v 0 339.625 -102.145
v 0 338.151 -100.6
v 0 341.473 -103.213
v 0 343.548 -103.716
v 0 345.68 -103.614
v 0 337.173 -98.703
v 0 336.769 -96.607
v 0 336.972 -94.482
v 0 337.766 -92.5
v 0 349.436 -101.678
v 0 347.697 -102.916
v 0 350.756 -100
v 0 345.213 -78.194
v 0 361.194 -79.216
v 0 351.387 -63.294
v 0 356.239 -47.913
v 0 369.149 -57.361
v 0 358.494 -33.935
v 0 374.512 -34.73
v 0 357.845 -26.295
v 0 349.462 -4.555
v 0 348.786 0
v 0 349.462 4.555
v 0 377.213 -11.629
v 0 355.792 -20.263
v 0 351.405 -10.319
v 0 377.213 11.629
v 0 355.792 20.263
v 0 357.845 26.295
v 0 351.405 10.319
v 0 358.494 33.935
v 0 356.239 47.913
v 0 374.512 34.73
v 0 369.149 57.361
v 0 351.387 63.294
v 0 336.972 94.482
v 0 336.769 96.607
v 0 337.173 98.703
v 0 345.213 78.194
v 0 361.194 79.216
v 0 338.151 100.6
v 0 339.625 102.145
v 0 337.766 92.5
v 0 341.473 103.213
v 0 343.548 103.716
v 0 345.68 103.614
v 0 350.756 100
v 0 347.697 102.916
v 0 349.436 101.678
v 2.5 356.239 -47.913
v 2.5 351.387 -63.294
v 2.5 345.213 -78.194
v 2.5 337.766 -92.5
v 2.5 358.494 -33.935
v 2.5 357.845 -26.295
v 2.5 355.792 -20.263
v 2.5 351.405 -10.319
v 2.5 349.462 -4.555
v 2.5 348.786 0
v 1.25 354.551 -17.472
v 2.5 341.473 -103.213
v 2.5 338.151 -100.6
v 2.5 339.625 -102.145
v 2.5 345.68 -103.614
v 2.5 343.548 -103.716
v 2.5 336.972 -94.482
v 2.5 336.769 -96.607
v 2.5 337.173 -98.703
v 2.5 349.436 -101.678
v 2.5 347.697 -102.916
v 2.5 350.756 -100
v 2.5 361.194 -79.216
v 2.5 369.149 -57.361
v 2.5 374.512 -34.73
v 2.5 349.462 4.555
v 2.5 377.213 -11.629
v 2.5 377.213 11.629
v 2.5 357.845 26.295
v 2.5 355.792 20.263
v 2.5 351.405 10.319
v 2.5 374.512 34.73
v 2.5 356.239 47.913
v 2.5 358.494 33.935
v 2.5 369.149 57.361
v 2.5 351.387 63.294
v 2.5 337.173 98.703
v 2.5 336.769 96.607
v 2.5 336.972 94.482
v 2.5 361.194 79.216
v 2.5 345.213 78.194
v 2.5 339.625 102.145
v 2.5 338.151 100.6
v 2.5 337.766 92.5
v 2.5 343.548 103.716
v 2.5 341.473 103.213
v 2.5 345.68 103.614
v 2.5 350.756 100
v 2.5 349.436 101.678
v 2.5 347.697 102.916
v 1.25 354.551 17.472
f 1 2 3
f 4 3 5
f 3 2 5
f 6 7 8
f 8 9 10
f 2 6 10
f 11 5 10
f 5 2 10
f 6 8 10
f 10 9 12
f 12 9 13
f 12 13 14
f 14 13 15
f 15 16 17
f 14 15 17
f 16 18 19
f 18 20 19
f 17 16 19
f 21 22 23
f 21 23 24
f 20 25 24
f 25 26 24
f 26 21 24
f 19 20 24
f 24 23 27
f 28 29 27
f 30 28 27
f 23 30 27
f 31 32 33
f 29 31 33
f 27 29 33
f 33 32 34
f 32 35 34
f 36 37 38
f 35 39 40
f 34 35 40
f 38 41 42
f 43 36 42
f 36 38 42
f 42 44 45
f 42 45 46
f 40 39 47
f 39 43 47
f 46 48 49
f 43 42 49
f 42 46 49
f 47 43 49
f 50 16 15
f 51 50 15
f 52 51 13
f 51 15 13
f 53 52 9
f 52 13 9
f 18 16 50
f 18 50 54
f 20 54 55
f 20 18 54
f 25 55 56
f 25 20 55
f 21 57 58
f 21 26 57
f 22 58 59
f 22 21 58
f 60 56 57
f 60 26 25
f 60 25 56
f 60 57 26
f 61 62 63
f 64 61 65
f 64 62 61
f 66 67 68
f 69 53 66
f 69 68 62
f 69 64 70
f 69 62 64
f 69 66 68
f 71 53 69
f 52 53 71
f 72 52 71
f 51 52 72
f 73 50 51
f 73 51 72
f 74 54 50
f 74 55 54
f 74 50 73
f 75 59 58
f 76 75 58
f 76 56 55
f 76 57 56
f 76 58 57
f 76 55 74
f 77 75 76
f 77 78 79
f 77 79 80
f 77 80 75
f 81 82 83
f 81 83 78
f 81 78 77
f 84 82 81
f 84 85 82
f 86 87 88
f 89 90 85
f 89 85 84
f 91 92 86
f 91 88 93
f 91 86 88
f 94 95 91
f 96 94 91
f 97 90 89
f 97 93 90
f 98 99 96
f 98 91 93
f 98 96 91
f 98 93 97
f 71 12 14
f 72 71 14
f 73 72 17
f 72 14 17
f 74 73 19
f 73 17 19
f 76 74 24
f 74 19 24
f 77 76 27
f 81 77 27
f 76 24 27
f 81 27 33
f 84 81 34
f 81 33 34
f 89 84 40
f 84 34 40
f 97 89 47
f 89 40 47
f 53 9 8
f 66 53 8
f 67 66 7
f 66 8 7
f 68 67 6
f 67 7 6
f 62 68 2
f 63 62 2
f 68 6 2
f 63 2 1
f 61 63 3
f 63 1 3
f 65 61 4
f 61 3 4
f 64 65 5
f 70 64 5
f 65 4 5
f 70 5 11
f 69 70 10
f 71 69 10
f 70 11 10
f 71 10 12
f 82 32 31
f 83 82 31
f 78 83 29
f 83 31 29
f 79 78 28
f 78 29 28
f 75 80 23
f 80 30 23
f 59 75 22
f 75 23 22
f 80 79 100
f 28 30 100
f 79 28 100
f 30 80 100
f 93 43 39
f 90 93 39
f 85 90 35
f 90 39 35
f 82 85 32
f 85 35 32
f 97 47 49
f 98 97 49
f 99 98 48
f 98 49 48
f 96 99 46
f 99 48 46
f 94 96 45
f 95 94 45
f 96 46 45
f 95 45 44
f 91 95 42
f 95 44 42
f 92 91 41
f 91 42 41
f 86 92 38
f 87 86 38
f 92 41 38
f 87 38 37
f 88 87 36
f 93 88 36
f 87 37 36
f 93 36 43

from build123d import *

# Parameters (mm, degrees)
RESSALTO_EXTRUS_O1_DEPTH = 2.5


with BuildPart() as part:
    # Esboço1 → Ressalto-extrusão1 (new body)
    with BuildSketch(Plane.YZ):
        with BuildLine():
            ThreePointArc((350.755952356, -100), (377.550871599, 0), (350.755952356, 100))
            ThreePointArc((350.755952356, 100), (340.510761827, 102.745190528), (337.765571299, 92.5))
            ThreePointArc((337.765571299, 92.5), (348.462298659, 70.811609925), (356.238644162, 47.913254287))
            add(Edge.make_bspline(
                [(356.238644162, 47.913254287), (360.34603799, 30.905478266), (357.108936786, 22.632743478), (348.864388441, 5.278932836), (348.785718872, 0)],
                knots=[0.097242939, 0.097242939, 0.097242939, 0.097242939, 0.646678025, 1, 1, 1, 1], degree=3))
            add(Edge.make_bspline(
                [(356.238644162, -47.913254287), (360.34603799, -30.905478266), (357.108936786, -22.632743478), (348.864388441, -5.278932836), (348.785718872, 0)],
                knots=[0.097242939, 0.097242939, 0.097242939, 0.097242939, 0.646678025, 1, 1, 1, 1], degree=3))
            ThreePointArc((356.238644162, -47.913254287), (348.462298659, -70.811609925), (337.765571299, -92.5))
            ThreePointArc((337.765571299, -92.5), (340.510761827, -102.745190528), (350.755952356, -100))
        make_face()
    extrude(amount=RESSALTO_EXTRUS_O1_DEPTH)


solid = part.part
